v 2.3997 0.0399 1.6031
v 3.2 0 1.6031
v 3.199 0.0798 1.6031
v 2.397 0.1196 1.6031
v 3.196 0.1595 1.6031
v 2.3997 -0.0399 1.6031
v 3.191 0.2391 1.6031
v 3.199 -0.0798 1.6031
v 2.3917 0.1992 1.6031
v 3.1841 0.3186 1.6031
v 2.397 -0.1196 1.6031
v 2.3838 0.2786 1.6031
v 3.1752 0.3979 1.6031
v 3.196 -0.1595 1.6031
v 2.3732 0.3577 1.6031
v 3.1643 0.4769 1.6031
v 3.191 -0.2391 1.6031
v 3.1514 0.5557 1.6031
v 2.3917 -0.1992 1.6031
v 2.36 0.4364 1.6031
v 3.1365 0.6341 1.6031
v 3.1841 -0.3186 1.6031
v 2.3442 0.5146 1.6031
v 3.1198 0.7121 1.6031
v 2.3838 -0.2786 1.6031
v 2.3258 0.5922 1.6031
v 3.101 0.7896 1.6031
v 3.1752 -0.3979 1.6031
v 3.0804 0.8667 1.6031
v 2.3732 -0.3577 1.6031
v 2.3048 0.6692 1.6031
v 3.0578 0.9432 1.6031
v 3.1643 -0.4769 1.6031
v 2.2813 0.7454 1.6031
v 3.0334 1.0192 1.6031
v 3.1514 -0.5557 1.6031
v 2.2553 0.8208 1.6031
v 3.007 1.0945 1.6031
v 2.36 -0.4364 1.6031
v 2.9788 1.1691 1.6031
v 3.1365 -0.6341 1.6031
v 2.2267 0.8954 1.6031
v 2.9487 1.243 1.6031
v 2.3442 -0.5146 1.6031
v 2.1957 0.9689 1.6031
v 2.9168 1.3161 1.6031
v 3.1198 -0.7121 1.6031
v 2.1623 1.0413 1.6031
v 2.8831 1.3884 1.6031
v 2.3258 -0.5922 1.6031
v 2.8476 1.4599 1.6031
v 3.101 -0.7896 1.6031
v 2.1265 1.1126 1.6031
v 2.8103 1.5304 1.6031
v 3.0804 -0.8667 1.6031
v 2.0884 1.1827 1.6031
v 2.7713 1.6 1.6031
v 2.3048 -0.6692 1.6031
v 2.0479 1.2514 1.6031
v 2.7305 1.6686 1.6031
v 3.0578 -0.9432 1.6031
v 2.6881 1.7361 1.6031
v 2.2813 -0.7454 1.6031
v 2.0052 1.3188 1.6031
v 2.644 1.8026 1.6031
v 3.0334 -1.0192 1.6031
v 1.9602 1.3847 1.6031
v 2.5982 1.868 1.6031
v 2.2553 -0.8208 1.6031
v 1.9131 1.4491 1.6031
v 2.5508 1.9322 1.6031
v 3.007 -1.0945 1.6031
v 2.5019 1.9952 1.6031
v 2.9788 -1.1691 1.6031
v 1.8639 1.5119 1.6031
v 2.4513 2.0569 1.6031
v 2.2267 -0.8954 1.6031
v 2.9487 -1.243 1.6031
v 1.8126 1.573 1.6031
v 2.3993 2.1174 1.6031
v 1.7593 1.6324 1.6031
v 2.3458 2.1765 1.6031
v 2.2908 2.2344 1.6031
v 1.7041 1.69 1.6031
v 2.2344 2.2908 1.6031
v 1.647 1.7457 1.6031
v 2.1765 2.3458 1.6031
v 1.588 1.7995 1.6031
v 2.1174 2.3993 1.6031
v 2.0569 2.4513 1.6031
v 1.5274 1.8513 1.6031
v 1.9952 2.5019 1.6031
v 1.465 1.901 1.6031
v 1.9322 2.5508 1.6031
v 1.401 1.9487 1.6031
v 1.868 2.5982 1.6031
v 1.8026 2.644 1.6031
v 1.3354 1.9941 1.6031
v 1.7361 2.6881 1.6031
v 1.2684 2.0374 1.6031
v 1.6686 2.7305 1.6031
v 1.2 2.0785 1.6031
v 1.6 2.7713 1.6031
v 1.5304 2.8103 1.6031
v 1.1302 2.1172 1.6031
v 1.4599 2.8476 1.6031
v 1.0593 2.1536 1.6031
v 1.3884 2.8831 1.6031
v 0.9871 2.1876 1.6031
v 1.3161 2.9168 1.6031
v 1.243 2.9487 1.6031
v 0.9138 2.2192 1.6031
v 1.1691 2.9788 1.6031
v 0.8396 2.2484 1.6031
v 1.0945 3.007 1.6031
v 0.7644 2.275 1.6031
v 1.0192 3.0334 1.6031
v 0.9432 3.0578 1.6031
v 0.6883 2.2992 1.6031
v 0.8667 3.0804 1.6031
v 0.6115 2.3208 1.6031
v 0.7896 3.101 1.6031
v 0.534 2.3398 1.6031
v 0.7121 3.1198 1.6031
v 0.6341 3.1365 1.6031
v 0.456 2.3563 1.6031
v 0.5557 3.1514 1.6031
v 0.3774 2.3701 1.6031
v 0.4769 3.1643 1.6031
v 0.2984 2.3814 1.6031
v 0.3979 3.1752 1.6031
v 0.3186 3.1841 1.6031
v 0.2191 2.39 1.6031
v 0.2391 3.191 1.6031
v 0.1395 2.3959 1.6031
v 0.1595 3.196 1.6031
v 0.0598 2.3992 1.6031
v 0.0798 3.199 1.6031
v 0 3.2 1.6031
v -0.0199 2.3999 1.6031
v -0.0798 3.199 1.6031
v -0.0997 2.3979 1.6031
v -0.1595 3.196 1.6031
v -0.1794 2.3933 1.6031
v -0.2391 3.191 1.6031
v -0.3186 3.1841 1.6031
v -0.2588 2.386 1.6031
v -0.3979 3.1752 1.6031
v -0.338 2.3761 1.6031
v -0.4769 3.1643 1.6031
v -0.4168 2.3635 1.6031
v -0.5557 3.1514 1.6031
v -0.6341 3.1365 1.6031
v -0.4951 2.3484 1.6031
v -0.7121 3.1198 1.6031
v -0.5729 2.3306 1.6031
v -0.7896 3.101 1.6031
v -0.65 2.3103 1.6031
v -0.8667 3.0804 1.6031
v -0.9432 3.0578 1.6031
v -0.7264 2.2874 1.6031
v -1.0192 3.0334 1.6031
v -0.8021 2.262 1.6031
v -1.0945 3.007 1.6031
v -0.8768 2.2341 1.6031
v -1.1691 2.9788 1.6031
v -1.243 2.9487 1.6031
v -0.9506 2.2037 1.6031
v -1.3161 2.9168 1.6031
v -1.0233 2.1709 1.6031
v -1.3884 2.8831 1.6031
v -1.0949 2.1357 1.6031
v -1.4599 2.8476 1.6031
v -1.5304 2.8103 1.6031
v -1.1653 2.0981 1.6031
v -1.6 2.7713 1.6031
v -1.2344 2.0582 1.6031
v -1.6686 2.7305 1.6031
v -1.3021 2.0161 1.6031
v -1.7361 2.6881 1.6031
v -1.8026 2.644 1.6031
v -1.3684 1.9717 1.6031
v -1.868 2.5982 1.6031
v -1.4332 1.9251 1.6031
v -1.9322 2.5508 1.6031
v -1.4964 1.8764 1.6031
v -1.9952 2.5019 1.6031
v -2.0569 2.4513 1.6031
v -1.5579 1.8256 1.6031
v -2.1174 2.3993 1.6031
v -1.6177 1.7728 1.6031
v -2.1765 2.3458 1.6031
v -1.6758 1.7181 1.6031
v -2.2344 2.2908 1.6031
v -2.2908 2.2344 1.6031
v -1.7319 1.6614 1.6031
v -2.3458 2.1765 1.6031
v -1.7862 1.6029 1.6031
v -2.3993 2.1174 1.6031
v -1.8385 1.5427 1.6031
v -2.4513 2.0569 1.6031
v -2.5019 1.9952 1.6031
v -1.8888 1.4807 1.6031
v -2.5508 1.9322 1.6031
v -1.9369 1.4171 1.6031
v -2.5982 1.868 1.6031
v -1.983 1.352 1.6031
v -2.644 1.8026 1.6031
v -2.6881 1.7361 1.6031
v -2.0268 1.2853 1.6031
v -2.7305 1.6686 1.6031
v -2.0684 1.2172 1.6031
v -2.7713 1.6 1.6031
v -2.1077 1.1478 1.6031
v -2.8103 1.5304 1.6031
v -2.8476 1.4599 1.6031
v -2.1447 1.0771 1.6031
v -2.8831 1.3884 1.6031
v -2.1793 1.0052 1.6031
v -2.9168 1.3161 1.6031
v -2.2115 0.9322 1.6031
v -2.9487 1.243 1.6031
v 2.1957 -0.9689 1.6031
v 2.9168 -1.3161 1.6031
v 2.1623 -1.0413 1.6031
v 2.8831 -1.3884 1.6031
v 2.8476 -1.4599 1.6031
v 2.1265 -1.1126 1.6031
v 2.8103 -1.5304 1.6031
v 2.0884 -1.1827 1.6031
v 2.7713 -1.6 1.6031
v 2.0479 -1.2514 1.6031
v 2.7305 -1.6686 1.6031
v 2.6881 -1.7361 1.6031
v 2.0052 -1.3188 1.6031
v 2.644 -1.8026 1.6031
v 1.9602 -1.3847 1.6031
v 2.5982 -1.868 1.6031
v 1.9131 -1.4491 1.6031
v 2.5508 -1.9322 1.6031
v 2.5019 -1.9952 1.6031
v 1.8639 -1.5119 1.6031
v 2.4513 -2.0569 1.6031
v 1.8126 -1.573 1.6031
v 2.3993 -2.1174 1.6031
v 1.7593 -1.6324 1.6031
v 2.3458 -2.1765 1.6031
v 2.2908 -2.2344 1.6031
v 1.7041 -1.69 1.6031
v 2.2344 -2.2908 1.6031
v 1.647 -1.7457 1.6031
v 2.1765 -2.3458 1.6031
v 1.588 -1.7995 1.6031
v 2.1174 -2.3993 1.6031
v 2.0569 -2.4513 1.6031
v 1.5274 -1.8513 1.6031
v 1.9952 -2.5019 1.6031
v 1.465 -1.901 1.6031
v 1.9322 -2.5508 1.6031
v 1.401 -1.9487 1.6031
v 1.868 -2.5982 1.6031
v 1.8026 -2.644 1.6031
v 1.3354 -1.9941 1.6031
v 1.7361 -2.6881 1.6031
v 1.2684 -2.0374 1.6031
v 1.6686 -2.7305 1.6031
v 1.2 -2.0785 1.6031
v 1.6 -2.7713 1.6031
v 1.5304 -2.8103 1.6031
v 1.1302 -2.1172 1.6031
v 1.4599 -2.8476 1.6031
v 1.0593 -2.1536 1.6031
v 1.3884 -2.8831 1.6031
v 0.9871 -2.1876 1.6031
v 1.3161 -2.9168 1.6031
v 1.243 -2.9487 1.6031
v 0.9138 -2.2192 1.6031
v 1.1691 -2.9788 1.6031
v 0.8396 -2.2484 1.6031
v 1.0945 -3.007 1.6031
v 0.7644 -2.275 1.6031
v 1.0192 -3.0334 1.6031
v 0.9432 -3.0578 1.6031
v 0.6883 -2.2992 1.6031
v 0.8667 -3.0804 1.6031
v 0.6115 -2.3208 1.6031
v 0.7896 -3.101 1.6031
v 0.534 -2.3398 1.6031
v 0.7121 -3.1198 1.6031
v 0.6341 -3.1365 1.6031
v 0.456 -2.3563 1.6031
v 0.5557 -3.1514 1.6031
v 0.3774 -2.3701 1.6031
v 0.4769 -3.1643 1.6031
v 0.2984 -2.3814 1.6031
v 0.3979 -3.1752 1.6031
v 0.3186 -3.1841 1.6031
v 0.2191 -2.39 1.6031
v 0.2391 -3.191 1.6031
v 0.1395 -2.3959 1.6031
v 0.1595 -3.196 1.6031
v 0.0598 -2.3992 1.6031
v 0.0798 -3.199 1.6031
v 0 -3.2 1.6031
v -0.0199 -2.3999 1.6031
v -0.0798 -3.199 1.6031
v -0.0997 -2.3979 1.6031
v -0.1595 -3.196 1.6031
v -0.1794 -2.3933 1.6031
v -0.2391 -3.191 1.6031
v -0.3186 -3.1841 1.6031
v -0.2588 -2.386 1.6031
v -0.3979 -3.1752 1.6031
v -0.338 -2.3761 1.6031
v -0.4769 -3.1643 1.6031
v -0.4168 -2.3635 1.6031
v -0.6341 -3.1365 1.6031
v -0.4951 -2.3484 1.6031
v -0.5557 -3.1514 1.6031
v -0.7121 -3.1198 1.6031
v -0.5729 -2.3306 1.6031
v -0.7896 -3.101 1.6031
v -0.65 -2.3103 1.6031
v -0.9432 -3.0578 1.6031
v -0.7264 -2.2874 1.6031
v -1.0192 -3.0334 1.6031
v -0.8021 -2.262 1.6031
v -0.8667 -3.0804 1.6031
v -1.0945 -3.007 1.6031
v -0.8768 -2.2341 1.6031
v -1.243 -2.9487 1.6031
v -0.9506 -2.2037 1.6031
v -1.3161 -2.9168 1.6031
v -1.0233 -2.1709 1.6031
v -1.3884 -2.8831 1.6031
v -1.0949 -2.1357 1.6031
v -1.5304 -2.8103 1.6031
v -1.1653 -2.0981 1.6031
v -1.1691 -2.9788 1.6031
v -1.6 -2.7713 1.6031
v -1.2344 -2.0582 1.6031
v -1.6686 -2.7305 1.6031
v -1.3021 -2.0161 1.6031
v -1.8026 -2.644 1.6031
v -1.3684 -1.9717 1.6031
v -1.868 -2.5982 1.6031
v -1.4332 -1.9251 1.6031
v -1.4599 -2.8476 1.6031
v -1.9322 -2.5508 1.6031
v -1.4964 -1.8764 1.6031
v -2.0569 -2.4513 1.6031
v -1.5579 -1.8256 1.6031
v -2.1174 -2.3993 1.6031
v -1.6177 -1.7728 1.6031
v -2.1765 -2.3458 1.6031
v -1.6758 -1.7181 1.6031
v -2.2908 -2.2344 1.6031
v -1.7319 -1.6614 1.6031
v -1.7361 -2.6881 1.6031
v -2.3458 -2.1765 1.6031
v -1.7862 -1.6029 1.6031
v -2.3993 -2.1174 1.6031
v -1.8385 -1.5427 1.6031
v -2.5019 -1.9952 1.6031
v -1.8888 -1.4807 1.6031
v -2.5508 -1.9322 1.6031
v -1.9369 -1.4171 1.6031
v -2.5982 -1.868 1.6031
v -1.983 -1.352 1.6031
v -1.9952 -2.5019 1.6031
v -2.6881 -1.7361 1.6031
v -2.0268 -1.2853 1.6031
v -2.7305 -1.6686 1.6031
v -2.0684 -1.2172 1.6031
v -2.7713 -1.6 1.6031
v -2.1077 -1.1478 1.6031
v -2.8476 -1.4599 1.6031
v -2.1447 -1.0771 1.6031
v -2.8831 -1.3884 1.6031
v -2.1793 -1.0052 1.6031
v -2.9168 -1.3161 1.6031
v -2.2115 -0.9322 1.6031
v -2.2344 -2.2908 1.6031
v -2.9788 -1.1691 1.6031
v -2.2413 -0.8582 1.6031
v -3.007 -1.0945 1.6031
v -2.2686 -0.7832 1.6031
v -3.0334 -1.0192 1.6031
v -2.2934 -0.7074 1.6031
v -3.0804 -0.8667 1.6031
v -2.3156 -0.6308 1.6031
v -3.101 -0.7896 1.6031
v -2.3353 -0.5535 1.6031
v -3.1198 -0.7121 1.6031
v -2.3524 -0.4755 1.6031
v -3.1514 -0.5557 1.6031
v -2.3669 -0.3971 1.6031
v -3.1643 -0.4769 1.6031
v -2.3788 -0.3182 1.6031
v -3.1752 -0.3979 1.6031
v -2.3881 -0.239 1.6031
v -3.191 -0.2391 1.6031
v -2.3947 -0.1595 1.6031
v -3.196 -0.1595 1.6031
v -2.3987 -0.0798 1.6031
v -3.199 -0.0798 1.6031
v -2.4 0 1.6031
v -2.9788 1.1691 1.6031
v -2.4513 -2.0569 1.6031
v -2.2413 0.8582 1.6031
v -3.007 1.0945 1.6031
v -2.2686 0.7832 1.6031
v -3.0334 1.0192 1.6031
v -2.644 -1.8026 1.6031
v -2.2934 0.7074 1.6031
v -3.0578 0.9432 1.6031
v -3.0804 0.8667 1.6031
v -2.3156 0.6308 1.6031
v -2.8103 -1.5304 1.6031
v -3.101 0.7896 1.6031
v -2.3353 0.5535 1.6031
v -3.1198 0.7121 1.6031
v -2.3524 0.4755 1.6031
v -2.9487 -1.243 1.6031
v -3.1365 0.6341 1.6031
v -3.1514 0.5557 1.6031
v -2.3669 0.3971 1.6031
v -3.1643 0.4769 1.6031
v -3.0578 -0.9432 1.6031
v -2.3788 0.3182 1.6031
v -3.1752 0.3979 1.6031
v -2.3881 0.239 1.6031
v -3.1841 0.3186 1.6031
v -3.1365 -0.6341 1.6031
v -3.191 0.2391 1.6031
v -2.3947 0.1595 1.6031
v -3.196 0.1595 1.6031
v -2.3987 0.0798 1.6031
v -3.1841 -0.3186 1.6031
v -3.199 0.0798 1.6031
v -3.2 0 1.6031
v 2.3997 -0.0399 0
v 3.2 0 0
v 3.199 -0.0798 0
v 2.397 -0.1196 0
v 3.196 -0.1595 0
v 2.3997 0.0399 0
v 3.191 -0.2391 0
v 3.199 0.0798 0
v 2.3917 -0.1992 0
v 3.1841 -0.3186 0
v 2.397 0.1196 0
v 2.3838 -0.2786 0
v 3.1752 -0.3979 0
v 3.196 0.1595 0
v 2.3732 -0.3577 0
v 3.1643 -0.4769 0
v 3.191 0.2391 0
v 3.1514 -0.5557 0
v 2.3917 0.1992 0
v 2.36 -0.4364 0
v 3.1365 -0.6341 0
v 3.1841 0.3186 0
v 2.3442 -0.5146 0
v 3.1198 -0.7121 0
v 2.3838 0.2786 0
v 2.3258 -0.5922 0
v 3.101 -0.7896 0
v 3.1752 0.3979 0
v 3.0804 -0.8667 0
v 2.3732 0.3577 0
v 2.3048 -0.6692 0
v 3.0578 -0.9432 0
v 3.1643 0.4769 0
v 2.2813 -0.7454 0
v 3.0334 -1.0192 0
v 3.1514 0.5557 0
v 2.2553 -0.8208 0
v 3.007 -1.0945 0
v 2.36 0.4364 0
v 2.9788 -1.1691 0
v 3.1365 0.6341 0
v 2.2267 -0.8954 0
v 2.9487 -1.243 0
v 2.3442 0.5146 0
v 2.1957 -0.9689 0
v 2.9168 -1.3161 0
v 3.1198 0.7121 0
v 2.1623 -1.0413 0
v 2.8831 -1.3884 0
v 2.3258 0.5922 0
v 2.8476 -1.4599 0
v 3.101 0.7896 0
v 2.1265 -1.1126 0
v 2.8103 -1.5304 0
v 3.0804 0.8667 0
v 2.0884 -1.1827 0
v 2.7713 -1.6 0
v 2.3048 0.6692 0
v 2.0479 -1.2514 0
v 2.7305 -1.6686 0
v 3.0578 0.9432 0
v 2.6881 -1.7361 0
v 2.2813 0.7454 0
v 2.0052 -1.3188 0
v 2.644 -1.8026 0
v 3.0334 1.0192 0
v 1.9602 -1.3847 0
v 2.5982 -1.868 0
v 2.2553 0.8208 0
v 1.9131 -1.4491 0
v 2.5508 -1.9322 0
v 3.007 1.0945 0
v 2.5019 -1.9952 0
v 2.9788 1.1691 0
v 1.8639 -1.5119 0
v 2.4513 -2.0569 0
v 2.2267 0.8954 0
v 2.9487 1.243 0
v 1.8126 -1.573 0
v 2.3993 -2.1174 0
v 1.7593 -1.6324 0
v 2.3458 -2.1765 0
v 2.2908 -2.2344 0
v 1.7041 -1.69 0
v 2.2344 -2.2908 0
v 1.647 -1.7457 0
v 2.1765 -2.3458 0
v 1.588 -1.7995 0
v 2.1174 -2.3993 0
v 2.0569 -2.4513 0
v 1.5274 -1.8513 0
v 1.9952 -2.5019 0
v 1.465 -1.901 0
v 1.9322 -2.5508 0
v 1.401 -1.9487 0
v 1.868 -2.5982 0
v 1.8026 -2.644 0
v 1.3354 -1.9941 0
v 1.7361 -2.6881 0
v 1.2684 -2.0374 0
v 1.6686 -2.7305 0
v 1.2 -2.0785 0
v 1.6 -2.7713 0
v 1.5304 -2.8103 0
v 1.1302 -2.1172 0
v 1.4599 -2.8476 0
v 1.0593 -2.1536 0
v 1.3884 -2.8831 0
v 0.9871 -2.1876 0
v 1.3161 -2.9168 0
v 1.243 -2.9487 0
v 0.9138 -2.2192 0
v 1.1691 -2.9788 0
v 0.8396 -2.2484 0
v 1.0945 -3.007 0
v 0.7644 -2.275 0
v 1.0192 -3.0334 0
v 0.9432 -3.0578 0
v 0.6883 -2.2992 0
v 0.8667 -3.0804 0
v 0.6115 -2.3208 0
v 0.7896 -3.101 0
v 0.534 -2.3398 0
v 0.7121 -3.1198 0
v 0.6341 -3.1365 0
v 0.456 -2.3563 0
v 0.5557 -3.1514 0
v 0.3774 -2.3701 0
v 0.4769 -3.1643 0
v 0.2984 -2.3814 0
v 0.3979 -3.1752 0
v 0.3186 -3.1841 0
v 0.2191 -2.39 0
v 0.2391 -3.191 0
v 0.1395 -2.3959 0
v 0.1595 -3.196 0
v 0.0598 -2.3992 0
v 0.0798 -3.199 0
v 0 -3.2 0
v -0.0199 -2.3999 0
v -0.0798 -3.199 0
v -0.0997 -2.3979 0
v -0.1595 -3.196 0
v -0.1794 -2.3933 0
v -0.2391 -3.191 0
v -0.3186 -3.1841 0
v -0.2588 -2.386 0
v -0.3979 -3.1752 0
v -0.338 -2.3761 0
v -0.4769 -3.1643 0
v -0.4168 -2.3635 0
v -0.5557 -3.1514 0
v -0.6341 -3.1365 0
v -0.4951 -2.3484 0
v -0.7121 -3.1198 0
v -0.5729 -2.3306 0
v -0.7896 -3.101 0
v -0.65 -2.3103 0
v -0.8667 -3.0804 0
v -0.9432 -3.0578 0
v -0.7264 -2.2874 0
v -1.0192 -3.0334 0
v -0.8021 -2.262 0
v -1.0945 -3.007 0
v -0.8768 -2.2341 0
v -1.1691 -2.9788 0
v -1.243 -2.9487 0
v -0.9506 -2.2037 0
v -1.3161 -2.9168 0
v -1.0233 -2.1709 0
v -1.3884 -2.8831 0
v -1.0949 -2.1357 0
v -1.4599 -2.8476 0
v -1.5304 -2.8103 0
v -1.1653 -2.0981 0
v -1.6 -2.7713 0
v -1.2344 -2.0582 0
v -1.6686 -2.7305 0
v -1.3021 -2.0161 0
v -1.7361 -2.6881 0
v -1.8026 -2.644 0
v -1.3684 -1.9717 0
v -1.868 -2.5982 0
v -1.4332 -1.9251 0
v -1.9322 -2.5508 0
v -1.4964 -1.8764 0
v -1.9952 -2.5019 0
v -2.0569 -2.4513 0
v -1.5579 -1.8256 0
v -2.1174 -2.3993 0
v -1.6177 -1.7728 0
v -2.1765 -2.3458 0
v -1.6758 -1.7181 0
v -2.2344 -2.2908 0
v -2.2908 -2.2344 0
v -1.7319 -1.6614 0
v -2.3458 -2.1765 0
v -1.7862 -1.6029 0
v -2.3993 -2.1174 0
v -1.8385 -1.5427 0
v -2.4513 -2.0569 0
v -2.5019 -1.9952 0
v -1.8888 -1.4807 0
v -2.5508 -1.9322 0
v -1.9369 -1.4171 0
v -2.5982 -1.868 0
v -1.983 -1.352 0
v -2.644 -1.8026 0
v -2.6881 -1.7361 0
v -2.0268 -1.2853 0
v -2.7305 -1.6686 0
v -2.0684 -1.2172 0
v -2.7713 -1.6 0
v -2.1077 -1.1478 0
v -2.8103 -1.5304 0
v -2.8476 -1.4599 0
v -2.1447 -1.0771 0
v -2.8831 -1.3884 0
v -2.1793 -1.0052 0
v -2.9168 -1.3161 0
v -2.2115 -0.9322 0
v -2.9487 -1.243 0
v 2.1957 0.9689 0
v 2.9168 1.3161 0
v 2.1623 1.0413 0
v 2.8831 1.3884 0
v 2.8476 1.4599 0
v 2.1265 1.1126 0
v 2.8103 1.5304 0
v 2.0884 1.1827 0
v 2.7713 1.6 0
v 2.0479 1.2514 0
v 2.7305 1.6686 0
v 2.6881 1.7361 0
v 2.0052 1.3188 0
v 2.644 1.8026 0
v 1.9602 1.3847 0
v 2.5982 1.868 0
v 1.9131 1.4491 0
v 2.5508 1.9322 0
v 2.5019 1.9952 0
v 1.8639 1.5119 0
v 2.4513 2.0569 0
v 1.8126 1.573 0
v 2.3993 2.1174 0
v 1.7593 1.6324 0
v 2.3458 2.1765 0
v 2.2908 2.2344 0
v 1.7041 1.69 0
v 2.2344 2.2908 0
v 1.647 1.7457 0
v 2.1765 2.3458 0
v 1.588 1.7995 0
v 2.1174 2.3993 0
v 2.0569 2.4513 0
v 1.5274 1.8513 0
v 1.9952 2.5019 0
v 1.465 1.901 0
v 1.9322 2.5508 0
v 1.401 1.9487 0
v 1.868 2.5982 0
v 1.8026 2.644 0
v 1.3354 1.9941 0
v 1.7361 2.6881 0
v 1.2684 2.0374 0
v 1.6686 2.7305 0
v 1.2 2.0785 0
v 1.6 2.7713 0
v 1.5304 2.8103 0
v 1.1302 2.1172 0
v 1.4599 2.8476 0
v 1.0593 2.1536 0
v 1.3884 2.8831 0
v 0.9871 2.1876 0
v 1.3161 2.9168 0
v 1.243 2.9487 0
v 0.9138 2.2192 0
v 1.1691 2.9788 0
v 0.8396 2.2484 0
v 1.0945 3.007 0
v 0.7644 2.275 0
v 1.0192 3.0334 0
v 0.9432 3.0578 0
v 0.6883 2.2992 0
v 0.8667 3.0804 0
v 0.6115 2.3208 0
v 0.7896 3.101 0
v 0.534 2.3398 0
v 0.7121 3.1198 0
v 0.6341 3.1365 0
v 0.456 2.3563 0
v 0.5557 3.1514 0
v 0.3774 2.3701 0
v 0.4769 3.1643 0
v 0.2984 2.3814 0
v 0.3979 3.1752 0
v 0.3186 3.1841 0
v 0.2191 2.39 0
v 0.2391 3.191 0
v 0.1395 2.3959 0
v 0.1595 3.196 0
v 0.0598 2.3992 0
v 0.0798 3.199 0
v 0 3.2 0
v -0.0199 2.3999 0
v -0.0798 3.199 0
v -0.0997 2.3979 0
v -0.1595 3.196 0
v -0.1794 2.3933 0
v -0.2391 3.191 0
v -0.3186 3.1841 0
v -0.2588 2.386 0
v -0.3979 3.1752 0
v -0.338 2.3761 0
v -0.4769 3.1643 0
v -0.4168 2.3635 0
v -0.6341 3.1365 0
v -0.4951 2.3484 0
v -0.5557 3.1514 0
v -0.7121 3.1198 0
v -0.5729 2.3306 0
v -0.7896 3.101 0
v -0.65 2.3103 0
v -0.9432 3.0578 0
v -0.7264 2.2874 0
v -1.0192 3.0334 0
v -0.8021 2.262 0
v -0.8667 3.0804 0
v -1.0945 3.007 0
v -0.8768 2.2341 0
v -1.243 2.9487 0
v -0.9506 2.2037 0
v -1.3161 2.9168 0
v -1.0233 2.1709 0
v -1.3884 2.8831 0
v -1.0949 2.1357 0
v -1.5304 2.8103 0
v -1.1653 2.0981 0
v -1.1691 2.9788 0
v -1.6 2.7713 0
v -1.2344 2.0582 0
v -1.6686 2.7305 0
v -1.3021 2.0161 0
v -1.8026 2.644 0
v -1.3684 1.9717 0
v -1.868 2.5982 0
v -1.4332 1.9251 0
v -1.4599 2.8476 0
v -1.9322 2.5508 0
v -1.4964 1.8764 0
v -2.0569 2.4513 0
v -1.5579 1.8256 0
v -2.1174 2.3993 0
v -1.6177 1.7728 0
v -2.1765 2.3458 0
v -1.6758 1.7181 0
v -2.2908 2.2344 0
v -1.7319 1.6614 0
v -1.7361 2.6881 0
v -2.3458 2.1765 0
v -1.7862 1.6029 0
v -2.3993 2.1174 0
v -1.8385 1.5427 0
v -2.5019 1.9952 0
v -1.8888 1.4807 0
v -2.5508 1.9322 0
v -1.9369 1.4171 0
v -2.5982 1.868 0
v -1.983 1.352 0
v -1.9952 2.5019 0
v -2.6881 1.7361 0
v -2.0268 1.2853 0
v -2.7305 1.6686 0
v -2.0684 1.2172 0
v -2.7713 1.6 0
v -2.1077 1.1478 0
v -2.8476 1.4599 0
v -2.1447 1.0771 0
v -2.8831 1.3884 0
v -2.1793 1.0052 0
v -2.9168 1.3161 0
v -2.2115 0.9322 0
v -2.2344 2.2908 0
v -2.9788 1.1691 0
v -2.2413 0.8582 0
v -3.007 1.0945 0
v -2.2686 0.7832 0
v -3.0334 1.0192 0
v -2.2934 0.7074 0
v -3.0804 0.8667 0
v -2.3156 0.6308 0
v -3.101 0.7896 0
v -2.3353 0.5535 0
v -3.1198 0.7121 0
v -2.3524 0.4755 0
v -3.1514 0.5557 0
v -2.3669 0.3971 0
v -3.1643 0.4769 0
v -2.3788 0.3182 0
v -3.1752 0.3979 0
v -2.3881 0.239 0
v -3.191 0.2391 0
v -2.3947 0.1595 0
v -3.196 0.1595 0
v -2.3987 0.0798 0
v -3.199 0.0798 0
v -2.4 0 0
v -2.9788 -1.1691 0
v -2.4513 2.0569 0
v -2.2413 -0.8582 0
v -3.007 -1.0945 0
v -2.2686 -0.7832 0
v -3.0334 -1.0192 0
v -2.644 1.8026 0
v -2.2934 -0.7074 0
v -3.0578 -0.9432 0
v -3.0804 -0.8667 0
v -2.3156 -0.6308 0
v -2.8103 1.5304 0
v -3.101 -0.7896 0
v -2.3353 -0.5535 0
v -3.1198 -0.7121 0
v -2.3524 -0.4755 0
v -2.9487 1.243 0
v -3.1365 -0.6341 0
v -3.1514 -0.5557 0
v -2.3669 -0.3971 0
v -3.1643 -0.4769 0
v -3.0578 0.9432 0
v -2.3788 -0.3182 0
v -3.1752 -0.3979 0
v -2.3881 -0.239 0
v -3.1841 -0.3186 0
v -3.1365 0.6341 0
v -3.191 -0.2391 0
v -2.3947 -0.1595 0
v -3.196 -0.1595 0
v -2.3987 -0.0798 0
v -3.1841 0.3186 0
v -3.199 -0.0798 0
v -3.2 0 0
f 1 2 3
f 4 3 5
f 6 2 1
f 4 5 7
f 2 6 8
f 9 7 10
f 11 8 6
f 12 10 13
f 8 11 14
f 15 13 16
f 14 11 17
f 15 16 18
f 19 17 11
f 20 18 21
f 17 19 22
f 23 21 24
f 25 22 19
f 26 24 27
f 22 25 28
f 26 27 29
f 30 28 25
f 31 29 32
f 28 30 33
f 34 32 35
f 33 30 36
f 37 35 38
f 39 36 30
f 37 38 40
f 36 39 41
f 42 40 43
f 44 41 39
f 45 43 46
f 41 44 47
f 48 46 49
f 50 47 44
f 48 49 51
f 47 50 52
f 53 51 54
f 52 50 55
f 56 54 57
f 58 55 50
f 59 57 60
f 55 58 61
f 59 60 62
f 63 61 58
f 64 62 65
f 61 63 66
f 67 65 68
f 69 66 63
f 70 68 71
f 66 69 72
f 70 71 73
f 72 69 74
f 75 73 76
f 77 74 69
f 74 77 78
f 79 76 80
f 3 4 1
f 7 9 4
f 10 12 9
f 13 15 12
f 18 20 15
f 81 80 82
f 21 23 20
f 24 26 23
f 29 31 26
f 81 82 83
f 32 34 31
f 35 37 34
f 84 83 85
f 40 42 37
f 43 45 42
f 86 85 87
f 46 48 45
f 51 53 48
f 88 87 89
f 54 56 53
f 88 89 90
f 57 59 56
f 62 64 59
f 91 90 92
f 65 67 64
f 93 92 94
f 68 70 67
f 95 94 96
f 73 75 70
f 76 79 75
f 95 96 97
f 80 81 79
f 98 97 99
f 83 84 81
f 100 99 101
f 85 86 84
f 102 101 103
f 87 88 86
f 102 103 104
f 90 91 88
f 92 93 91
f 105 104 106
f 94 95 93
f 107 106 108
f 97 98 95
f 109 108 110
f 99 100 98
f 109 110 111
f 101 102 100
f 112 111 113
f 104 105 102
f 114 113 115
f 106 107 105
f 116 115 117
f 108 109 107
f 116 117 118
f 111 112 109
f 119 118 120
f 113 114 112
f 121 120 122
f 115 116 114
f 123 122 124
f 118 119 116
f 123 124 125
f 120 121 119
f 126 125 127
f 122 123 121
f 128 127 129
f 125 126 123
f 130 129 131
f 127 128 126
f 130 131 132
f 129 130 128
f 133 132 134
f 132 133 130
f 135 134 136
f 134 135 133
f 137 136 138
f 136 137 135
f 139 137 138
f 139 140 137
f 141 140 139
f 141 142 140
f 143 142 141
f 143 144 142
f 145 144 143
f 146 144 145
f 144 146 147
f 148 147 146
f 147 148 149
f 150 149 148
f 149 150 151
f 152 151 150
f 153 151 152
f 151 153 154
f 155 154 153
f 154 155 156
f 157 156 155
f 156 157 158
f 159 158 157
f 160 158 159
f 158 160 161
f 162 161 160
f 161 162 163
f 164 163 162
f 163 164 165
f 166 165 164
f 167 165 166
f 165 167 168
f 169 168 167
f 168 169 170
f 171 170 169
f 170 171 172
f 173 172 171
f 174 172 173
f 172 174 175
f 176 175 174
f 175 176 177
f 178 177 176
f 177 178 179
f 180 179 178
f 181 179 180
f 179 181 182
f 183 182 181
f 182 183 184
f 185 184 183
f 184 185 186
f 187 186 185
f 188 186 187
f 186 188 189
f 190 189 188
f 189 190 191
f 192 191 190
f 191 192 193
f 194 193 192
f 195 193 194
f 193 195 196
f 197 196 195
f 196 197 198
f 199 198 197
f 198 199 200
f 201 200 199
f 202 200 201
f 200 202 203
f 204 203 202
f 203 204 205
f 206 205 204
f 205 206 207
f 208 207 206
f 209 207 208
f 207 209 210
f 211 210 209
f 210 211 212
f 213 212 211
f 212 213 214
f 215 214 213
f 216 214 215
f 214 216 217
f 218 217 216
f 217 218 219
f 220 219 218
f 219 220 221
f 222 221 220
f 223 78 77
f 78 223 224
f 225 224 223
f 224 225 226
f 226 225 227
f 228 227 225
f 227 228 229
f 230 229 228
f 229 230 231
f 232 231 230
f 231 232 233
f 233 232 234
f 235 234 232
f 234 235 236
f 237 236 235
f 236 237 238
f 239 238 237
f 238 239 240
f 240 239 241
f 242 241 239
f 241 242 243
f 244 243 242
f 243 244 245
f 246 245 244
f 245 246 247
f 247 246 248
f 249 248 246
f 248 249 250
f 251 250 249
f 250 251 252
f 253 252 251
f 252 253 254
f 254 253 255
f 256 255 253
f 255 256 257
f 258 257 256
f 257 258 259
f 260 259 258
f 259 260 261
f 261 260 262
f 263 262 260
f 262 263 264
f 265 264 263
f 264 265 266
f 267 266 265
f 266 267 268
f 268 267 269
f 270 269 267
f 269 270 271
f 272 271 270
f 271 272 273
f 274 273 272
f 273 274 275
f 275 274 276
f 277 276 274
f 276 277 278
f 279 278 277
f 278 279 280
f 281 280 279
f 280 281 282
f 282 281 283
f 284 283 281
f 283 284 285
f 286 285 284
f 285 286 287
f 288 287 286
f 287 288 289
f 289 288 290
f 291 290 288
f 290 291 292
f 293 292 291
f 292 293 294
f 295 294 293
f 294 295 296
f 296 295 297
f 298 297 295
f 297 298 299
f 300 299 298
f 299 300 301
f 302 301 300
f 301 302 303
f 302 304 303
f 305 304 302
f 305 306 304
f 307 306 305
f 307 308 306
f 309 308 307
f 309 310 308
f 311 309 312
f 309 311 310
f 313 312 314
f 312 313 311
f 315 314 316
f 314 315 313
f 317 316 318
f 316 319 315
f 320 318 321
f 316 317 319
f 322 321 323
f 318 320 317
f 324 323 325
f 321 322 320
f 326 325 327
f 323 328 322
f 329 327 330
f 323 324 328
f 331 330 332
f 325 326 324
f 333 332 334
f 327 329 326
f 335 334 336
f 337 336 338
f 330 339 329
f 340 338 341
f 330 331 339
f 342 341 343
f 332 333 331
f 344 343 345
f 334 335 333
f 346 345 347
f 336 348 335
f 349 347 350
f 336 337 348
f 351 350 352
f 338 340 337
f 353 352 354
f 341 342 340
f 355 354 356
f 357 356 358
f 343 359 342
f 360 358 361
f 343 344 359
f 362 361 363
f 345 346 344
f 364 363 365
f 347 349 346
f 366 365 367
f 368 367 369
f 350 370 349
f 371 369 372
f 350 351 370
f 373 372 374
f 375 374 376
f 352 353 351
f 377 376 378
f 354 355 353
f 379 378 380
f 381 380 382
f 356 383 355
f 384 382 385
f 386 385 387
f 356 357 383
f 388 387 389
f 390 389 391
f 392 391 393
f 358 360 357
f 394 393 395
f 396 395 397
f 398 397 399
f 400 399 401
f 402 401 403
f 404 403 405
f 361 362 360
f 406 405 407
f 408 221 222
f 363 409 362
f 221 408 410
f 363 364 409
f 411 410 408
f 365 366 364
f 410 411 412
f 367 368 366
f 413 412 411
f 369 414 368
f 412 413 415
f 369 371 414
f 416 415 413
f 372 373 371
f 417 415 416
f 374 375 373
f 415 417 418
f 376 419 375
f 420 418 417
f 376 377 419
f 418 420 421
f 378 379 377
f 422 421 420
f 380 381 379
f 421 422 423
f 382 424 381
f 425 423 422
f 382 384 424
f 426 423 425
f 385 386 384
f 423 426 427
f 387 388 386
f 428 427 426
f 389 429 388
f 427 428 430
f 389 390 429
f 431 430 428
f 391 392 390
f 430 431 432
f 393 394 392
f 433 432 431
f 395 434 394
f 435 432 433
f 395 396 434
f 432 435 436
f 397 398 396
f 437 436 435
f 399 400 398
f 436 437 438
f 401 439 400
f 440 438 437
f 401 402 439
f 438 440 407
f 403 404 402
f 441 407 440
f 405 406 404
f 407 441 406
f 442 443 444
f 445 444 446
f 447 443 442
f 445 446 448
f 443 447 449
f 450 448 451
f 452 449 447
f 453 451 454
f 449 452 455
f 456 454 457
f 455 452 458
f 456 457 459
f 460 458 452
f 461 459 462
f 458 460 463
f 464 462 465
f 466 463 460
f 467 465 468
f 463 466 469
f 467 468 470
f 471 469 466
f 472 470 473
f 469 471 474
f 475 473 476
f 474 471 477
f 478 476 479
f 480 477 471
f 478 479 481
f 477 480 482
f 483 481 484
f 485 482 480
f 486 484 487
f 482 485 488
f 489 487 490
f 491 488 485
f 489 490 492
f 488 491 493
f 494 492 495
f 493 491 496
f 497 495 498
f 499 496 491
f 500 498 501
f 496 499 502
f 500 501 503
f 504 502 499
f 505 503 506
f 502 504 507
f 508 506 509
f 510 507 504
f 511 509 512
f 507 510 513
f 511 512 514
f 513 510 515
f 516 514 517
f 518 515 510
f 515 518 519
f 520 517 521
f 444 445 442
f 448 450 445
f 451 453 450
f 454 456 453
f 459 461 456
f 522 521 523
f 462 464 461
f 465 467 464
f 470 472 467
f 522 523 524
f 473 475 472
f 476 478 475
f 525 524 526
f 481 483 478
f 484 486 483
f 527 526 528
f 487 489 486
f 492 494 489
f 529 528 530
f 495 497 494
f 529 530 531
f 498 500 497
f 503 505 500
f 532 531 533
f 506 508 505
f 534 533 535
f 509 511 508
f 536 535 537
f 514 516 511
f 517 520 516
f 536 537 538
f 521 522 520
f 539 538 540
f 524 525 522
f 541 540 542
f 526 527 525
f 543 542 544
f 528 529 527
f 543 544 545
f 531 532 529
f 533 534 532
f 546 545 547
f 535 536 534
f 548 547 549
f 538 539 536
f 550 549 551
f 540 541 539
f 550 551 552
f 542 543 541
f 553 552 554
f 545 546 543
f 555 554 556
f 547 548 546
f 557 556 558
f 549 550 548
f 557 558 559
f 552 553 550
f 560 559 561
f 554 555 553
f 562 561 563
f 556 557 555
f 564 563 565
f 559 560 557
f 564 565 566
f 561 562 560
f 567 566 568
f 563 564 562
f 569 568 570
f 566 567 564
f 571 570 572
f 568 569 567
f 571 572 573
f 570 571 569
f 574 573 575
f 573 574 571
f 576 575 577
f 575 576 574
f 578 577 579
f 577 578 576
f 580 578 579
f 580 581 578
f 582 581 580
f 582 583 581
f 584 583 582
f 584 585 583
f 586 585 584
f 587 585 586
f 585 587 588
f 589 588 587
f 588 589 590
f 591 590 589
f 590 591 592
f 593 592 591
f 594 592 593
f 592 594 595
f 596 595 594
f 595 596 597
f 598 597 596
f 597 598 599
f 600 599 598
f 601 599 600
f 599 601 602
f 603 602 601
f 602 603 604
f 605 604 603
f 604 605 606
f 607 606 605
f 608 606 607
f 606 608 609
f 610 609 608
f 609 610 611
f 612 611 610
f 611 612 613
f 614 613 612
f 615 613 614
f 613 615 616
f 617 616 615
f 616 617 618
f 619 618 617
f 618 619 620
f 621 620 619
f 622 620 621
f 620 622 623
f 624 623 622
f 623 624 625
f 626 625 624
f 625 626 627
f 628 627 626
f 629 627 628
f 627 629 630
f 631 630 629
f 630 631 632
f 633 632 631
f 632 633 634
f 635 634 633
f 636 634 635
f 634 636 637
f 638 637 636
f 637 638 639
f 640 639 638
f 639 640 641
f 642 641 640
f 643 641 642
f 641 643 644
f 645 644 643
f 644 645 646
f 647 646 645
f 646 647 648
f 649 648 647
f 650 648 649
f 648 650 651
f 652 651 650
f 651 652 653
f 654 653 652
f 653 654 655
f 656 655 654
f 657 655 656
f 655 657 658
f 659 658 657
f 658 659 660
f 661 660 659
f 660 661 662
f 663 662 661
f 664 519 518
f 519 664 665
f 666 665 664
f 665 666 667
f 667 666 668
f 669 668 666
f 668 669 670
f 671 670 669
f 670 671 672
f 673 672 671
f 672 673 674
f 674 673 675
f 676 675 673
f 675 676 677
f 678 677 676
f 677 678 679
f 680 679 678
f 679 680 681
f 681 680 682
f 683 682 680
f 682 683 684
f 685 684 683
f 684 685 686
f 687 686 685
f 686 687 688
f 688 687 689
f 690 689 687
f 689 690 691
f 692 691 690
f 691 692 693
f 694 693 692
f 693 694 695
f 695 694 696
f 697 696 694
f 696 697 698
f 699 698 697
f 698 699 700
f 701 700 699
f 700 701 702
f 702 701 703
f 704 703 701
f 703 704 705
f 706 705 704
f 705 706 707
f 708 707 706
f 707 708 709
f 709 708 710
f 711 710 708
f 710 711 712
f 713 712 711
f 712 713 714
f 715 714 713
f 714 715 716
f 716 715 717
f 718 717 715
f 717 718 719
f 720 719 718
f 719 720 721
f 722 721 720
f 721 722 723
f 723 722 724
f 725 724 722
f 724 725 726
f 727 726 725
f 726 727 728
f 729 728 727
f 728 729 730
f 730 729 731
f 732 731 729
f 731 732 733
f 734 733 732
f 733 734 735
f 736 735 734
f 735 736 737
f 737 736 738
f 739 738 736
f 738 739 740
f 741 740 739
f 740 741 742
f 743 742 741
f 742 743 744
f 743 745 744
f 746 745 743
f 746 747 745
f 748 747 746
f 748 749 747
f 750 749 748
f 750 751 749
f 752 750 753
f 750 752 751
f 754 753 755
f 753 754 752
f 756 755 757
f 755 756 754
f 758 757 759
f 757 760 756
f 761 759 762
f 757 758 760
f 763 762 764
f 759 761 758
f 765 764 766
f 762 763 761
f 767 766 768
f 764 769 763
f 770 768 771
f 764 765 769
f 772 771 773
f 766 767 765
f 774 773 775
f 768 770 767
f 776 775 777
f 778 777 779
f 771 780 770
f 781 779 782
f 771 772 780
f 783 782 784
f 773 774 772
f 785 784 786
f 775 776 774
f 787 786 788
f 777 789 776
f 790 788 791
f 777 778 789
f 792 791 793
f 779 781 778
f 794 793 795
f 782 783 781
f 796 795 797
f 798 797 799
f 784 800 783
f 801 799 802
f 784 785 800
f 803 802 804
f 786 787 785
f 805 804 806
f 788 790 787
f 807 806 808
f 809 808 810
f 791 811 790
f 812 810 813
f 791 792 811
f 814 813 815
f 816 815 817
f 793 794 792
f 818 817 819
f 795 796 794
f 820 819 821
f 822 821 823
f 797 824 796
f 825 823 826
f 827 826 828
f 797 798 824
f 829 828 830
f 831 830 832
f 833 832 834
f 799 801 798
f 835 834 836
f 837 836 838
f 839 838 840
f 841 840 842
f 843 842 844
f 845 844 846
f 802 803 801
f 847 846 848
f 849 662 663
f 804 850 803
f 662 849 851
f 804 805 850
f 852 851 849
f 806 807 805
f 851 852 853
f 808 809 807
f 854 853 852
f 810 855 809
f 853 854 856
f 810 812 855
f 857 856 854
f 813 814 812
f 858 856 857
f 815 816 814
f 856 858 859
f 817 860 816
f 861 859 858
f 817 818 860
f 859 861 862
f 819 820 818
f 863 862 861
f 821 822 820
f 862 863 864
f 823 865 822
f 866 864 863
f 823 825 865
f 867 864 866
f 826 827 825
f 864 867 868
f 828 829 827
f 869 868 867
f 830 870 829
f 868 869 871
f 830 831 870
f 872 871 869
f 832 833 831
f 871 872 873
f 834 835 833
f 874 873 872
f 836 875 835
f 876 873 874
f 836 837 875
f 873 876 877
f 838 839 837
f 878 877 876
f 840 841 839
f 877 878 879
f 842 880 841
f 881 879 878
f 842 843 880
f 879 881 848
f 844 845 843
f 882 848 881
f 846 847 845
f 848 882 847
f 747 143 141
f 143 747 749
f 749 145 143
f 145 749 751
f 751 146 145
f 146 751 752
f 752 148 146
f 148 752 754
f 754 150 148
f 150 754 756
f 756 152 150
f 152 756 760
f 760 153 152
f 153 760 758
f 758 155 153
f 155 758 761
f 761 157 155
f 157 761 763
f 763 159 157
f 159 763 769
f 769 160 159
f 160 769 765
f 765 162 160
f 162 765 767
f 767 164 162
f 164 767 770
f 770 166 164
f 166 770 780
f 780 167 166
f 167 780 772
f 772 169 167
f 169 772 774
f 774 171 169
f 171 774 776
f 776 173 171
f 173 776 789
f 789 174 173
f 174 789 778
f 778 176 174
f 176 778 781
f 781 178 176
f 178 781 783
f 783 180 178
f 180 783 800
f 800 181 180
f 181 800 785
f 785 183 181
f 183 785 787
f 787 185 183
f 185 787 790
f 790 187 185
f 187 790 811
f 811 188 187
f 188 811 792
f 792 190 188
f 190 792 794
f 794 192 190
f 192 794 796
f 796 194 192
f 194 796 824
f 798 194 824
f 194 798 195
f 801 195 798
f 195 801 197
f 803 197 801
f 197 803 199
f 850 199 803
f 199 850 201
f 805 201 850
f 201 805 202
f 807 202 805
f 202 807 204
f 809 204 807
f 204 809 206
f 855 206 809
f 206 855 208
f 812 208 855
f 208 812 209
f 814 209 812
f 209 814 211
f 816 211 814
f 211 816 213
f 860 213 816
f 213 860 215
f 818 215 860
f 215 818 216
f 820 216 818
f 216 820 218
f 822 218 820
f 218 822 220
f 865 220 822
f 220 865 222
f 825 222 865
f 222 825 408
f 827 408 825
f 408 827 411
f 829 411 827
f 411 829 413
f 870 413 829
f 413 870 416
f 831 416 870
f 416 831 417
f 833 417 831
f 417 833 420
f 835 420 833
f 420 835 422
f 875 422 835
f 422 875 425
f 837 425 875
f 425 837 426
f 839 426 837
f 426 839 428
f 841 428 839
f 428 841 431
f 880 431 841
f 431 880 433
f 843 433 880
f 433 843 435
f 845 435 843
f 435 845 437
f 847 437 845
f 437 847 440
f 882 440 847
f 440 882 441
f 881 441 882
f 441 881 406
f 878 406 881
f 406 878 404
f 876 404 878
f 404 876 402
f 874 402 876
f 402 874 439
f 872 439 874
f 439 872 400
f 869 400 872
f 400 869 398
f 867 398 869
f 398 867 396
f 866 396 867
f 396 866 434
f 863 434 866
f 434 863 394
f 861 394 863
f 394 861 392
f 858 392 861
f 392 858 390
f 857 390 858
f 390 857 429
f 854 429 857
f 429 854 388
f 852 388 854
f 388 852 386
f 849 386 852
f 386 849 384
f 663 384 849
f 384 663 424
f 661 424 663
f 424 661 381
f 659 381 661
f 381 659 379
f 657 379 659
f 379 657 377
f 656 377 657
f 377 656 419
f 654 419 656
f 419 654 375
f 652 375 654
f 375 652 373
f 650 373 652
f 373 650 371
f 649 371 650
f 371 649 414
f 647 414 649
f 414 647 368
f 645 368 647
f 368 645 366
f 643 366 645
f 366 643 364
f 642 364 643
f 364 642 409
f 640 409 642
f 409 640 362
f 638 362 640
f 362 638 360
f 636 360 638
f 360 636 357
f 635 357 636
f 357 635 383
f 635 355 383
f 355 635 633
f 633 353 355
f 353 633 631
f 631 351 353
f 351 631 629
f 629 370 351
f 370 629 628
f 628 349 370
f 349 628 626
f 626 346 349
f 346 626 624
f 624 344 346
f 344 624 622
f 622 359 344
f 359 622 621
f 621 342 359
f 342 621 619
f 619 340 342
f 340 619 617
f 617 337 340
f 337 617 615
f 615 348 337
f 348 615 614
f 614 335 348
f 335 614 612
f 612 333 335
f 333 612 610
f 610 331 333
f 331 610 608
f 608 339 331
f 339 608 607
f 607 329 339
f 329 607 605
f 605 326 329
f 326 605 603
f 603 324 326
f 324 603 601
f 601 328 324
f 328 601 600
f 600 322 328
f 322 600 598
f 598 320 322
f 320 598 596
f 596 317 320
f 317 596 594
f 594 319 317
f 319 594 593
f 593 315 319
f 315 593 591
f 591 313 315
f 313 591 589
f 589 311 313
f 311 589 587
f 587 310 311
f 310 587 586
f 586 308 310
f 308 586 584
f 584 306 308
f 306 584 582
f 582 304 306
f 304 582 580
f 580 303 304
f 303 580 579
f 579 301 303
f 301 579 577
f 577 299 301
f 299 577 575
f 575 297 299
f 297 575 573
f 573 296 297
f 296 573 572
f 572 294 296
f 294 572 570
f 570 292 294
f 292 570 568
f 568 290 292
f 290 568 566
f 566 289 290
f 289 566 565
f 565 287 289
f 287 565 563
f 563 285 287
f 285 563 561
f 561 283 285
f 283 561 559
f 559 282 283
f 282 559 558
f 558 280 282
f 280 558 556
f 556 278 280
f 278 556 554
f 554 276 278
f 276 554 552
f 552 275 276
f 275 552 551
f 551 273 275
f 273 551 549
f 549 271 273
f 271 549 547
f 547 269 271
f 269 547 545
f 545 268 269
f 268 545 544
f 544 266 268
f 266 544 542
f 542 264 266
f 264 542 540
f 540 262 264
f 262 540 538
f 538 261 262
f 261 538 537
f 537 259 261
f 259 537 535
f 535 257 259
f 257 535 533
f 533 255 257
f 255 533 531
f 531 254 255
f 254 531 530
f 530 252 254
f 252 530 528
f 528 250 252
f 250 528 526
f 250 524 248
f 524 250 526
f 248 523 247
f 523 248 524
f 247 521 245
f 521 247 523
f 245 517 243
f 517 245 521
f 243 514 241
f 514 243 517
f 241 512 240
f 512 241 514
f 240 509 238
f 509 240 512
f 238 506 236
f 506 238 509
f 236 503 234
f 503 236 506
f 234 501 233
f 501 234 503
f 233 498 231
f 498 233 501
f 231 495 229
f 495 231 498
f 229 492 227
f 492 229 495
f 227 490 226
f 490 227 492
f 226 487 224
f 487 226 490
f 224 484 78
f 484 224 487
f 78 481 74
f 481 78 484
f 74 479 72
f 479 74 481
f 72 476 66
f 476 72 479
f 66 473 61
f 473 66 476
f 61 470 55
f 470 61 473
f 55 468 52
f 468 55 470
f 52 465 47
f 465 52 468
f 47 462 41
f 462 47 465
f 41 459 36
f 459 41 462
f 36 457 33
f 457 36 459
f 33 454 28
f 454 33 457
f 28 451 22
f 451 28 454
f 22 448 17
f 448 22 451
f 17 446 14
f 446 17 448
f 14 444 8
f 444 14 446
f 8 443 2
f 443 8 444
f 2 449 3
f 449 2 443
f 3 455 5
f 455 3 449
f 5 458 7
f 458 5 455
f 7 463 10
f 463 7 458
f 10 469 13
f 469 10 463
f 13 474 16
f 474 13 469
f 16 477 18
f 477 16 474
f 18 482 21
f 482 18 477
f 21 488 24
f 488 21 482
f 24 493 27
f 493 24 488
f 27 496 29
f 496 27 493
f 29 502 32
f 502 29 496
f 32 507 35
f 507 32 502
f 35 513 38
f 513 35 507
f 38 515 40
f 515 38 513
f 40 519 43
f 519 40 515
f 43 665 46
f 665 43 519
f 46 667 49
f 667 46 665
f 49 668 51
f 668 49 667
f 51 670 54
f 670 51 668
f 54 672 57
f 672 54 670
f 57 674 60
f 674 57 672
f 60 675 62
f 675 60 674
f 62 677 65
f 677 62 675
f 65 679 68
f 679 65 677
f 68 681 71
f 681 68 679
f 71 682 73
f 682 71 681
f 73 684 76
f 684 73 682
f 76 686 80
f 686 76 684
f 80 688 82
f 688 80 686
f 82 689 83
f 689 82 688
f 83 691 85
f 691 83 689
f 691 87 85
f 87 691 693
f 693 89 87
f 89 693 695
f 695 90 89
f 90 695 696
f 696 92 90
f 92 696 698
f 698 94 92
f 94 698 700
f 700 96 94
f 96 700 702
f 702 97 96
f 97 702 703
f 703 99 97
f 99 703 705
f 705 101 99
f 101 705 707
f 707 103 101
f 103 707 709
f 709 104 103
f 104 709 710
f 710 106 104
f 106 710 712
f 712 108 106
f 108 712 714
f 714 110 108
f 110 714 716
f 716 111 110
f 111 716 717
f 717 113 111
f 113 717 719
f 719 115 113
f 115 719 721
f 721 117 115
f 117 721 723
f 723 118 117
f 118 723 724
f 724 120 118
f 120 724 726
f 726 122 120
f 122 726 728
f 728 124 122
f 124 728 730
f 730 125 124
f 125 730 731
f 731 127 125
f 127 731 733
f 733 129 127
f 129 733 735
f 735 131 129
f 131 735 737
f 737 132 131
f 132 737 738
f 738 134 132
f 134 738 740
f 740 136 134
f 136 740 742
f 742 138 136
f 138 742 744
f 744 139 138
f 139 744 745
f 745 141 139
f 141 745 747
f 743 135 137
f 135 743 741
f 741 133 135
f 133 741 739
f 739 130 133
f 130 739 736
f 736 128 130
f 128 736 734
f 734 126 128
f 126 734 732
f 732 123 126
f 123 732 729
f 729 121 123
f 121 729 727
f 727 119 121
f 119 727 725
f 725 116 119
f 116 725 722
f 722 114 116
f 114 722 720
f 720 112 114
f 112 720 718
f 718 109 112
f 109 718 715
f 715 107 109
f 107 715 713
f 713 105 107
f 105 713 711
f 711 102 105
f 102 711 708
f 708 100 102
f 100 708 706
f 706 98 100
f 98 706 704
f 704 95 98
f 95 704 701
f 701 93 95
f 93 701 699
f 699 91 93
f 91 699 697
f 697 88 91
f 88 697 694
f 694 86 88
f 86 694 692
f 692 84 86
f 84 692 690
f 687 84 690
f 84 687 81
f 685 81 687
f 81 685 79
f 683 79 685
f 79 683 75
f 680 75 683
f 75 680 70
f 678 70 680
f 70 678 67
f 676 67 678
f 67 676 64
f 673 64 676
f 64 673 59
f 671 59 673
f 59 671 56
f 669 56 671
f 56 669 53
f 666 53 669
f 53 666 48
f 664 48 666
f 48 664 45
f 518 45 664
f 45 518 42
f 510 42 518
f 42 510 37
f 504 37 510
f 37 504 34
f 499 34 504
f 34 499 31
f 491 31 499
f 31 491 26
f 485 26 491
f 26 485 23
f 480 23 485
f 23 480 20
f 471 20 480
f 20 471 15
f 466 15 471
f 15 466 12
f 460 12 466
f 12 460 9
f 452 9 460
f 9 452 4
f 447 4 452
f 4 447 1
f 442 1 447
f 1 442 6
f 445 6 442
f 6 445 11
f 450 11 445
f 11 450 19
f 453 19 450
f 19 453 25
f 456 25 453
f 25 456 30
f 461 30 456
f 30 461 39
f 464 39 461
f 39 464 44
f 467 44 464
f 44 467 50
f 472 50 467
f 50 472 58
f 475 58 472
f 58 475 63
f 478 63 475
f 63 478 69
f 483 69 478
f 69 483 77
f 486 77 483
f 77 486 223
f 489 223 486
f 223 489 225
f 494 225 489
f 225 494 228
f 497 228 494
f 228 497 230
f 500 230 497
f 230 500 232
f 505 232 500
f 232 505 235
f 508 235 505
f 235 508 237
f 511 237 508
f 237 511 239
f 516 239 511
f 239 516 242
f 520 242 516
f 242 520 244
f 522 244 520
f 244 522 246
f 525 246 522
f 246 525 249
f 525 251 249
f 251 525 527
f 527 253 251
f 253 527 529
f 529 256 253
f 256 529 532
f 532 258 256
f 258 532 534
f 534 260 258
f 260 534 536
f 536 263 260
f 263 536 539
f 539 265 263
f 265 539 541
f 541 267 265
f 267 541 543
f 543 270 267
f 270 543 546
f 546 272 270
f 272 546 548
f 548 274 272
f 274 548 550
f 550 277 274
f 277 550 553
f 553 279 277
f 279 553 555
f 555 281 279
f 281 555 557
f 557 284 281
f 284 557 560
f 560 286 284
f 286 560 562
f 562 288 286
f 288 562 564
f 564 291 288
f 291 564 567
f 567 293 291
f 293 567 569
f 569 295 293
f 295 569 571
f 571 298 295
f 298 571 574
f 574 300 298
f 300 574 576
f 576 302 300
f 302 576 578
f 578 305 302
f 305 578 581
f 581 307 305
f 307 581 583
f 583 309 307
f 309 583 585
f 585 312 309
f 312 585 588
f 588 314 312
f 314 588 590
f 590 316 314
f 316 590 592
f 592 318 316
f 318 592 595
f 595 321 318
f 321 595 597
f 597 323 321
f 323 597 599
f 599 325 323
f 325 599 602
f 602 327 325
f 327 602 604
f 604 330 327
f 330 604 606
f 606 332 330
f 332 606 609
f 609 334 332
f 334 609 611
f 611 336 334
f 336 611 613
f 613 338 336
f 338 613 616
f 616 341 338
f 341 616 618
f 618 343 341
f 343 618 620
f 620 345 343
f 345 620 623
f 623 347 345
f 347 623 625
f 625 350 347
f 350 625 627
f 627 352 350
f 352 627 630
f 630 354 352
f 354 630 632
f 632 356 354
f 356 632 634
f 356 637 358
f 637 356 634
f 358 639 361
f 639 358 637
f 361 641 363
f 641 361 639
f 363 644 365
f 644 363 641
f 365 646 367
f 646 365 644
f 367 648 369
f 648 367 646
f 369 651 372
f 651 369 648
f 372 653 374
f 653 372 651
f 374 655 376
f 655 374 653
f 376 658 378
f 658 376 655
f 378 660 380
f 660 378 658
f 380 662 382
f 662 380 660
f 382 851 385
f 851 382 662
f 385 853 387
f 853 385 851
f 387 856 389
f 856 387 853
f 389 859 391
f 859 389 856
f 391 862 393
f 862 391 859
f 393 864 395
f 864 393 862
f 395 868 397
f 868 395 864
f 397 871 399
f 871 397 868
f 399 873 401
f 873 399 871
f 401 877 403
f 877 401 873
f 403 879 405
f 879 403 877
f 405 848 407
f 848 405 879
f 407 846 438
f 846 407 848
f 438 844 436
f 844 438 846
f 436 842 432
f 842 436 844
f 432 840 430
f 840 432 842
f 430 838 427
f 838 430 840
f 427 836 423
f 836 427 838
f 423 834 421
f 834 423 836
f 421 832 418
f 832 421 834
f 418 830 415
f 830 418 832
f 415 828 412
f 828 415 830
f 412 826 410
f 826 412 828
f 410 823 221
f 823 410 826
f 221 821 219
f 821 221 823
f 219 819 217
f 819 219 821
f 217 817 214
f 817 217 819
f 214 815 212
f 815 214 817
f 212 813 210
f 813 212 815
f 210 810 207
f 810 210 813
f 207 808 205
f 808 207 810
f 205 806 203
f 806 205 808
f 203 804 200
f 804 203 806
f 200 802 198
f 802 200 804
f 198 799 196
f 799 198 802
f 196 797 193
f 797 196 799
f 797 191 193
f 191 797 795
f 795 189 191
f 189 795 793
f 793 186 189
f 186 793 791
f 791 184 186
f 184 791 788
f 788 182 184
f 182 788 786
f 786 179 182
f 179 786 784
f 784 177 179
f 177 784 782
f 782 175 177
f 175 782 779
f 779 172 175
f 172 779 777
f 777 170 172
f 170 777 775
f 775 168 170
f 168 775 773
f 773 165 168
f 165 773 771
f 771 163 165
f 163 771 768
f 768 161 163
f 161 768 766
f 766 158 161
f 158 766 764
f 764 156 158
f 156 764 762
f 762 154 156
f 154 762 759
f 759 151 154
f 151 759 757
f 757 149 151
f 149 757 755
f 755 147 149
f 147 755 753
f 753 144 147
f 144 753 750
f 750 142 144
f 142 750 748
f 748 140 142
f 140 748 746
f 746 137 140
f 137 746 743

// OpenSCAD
use <../lib.scad>
use <s/30408s02.scad>
use <s/30408s03.scad>
$fa=1; $fs=0.2;
function ldraw_lib__30408(realsolid=false) = [
// 0 Minifig Helmet Stormtrooper
// 0 Name: 30408.dat
// 0 Author: Alex Taylor [anathema]
// 0 !LDRAW_ORG Part UPDATE 2012-03
// 0 !LICENSE Licensed under CC BY 2.0 and CC BY 4.0 : see CAreadme.txt
// 
// 0 BFC CERTIFY CCW
  [0,"BFC","CERTIFY"],
  [0,"BFC","CCW"],
// 
// 0 !CATEGORY Minifig Headwear
// 
// 0 !HISTORY 2010-09-10 {LEGO Universe Team} Original part shape
// 0 !HISTORY 2010-09-11 [anathema] File preparation for LDraw Parts Tracker
// 0 !HISTORY 2011-12-29 [PTadmin] Official Update 2011-02
// 0 !HISTORY 2012-12-24 [cwdee] Update category
// 0 !HISTORY 2012-12-28 [PTadmin] Official Update 2012-03
// 
// 
// 1 16 0 0 0 1 0 0 0 1 0 0 0 1 s\30408s02.dat
  [1,16,0,0,0,1,0,0,0,1,0,0,0,1, ldraw_lib__s__30408s02(realsolid)],
// 1 16 0 0 0 1 0 0 0 1 0 0 0 1 s\30408s03.dat
  [1,16,0,0,0,1,0,0,0,1,0,0,0,1, ldraw_lib__s__30408s03(realsolid)],
// 1 16 0 0 0 -1 0 0 0 1 0 0 0 1 s\30408s03.dat
  [1,16,0,0,0,-1,0,0,0,1,0,0,0,1, ldraw_lib__s__30408s03(realsolid)],
// 0
];
module ldraw_lib__30408(step=0, col=false, unit=2/5, alt=false, line=0.2, solid=!$preview)
    makepoly(ldraw_lib__30408(solid), step=step, col=col, unit=unit, alt=alt, line=line, solid=solid);
ldraw_lib__30408(line=0.2);
